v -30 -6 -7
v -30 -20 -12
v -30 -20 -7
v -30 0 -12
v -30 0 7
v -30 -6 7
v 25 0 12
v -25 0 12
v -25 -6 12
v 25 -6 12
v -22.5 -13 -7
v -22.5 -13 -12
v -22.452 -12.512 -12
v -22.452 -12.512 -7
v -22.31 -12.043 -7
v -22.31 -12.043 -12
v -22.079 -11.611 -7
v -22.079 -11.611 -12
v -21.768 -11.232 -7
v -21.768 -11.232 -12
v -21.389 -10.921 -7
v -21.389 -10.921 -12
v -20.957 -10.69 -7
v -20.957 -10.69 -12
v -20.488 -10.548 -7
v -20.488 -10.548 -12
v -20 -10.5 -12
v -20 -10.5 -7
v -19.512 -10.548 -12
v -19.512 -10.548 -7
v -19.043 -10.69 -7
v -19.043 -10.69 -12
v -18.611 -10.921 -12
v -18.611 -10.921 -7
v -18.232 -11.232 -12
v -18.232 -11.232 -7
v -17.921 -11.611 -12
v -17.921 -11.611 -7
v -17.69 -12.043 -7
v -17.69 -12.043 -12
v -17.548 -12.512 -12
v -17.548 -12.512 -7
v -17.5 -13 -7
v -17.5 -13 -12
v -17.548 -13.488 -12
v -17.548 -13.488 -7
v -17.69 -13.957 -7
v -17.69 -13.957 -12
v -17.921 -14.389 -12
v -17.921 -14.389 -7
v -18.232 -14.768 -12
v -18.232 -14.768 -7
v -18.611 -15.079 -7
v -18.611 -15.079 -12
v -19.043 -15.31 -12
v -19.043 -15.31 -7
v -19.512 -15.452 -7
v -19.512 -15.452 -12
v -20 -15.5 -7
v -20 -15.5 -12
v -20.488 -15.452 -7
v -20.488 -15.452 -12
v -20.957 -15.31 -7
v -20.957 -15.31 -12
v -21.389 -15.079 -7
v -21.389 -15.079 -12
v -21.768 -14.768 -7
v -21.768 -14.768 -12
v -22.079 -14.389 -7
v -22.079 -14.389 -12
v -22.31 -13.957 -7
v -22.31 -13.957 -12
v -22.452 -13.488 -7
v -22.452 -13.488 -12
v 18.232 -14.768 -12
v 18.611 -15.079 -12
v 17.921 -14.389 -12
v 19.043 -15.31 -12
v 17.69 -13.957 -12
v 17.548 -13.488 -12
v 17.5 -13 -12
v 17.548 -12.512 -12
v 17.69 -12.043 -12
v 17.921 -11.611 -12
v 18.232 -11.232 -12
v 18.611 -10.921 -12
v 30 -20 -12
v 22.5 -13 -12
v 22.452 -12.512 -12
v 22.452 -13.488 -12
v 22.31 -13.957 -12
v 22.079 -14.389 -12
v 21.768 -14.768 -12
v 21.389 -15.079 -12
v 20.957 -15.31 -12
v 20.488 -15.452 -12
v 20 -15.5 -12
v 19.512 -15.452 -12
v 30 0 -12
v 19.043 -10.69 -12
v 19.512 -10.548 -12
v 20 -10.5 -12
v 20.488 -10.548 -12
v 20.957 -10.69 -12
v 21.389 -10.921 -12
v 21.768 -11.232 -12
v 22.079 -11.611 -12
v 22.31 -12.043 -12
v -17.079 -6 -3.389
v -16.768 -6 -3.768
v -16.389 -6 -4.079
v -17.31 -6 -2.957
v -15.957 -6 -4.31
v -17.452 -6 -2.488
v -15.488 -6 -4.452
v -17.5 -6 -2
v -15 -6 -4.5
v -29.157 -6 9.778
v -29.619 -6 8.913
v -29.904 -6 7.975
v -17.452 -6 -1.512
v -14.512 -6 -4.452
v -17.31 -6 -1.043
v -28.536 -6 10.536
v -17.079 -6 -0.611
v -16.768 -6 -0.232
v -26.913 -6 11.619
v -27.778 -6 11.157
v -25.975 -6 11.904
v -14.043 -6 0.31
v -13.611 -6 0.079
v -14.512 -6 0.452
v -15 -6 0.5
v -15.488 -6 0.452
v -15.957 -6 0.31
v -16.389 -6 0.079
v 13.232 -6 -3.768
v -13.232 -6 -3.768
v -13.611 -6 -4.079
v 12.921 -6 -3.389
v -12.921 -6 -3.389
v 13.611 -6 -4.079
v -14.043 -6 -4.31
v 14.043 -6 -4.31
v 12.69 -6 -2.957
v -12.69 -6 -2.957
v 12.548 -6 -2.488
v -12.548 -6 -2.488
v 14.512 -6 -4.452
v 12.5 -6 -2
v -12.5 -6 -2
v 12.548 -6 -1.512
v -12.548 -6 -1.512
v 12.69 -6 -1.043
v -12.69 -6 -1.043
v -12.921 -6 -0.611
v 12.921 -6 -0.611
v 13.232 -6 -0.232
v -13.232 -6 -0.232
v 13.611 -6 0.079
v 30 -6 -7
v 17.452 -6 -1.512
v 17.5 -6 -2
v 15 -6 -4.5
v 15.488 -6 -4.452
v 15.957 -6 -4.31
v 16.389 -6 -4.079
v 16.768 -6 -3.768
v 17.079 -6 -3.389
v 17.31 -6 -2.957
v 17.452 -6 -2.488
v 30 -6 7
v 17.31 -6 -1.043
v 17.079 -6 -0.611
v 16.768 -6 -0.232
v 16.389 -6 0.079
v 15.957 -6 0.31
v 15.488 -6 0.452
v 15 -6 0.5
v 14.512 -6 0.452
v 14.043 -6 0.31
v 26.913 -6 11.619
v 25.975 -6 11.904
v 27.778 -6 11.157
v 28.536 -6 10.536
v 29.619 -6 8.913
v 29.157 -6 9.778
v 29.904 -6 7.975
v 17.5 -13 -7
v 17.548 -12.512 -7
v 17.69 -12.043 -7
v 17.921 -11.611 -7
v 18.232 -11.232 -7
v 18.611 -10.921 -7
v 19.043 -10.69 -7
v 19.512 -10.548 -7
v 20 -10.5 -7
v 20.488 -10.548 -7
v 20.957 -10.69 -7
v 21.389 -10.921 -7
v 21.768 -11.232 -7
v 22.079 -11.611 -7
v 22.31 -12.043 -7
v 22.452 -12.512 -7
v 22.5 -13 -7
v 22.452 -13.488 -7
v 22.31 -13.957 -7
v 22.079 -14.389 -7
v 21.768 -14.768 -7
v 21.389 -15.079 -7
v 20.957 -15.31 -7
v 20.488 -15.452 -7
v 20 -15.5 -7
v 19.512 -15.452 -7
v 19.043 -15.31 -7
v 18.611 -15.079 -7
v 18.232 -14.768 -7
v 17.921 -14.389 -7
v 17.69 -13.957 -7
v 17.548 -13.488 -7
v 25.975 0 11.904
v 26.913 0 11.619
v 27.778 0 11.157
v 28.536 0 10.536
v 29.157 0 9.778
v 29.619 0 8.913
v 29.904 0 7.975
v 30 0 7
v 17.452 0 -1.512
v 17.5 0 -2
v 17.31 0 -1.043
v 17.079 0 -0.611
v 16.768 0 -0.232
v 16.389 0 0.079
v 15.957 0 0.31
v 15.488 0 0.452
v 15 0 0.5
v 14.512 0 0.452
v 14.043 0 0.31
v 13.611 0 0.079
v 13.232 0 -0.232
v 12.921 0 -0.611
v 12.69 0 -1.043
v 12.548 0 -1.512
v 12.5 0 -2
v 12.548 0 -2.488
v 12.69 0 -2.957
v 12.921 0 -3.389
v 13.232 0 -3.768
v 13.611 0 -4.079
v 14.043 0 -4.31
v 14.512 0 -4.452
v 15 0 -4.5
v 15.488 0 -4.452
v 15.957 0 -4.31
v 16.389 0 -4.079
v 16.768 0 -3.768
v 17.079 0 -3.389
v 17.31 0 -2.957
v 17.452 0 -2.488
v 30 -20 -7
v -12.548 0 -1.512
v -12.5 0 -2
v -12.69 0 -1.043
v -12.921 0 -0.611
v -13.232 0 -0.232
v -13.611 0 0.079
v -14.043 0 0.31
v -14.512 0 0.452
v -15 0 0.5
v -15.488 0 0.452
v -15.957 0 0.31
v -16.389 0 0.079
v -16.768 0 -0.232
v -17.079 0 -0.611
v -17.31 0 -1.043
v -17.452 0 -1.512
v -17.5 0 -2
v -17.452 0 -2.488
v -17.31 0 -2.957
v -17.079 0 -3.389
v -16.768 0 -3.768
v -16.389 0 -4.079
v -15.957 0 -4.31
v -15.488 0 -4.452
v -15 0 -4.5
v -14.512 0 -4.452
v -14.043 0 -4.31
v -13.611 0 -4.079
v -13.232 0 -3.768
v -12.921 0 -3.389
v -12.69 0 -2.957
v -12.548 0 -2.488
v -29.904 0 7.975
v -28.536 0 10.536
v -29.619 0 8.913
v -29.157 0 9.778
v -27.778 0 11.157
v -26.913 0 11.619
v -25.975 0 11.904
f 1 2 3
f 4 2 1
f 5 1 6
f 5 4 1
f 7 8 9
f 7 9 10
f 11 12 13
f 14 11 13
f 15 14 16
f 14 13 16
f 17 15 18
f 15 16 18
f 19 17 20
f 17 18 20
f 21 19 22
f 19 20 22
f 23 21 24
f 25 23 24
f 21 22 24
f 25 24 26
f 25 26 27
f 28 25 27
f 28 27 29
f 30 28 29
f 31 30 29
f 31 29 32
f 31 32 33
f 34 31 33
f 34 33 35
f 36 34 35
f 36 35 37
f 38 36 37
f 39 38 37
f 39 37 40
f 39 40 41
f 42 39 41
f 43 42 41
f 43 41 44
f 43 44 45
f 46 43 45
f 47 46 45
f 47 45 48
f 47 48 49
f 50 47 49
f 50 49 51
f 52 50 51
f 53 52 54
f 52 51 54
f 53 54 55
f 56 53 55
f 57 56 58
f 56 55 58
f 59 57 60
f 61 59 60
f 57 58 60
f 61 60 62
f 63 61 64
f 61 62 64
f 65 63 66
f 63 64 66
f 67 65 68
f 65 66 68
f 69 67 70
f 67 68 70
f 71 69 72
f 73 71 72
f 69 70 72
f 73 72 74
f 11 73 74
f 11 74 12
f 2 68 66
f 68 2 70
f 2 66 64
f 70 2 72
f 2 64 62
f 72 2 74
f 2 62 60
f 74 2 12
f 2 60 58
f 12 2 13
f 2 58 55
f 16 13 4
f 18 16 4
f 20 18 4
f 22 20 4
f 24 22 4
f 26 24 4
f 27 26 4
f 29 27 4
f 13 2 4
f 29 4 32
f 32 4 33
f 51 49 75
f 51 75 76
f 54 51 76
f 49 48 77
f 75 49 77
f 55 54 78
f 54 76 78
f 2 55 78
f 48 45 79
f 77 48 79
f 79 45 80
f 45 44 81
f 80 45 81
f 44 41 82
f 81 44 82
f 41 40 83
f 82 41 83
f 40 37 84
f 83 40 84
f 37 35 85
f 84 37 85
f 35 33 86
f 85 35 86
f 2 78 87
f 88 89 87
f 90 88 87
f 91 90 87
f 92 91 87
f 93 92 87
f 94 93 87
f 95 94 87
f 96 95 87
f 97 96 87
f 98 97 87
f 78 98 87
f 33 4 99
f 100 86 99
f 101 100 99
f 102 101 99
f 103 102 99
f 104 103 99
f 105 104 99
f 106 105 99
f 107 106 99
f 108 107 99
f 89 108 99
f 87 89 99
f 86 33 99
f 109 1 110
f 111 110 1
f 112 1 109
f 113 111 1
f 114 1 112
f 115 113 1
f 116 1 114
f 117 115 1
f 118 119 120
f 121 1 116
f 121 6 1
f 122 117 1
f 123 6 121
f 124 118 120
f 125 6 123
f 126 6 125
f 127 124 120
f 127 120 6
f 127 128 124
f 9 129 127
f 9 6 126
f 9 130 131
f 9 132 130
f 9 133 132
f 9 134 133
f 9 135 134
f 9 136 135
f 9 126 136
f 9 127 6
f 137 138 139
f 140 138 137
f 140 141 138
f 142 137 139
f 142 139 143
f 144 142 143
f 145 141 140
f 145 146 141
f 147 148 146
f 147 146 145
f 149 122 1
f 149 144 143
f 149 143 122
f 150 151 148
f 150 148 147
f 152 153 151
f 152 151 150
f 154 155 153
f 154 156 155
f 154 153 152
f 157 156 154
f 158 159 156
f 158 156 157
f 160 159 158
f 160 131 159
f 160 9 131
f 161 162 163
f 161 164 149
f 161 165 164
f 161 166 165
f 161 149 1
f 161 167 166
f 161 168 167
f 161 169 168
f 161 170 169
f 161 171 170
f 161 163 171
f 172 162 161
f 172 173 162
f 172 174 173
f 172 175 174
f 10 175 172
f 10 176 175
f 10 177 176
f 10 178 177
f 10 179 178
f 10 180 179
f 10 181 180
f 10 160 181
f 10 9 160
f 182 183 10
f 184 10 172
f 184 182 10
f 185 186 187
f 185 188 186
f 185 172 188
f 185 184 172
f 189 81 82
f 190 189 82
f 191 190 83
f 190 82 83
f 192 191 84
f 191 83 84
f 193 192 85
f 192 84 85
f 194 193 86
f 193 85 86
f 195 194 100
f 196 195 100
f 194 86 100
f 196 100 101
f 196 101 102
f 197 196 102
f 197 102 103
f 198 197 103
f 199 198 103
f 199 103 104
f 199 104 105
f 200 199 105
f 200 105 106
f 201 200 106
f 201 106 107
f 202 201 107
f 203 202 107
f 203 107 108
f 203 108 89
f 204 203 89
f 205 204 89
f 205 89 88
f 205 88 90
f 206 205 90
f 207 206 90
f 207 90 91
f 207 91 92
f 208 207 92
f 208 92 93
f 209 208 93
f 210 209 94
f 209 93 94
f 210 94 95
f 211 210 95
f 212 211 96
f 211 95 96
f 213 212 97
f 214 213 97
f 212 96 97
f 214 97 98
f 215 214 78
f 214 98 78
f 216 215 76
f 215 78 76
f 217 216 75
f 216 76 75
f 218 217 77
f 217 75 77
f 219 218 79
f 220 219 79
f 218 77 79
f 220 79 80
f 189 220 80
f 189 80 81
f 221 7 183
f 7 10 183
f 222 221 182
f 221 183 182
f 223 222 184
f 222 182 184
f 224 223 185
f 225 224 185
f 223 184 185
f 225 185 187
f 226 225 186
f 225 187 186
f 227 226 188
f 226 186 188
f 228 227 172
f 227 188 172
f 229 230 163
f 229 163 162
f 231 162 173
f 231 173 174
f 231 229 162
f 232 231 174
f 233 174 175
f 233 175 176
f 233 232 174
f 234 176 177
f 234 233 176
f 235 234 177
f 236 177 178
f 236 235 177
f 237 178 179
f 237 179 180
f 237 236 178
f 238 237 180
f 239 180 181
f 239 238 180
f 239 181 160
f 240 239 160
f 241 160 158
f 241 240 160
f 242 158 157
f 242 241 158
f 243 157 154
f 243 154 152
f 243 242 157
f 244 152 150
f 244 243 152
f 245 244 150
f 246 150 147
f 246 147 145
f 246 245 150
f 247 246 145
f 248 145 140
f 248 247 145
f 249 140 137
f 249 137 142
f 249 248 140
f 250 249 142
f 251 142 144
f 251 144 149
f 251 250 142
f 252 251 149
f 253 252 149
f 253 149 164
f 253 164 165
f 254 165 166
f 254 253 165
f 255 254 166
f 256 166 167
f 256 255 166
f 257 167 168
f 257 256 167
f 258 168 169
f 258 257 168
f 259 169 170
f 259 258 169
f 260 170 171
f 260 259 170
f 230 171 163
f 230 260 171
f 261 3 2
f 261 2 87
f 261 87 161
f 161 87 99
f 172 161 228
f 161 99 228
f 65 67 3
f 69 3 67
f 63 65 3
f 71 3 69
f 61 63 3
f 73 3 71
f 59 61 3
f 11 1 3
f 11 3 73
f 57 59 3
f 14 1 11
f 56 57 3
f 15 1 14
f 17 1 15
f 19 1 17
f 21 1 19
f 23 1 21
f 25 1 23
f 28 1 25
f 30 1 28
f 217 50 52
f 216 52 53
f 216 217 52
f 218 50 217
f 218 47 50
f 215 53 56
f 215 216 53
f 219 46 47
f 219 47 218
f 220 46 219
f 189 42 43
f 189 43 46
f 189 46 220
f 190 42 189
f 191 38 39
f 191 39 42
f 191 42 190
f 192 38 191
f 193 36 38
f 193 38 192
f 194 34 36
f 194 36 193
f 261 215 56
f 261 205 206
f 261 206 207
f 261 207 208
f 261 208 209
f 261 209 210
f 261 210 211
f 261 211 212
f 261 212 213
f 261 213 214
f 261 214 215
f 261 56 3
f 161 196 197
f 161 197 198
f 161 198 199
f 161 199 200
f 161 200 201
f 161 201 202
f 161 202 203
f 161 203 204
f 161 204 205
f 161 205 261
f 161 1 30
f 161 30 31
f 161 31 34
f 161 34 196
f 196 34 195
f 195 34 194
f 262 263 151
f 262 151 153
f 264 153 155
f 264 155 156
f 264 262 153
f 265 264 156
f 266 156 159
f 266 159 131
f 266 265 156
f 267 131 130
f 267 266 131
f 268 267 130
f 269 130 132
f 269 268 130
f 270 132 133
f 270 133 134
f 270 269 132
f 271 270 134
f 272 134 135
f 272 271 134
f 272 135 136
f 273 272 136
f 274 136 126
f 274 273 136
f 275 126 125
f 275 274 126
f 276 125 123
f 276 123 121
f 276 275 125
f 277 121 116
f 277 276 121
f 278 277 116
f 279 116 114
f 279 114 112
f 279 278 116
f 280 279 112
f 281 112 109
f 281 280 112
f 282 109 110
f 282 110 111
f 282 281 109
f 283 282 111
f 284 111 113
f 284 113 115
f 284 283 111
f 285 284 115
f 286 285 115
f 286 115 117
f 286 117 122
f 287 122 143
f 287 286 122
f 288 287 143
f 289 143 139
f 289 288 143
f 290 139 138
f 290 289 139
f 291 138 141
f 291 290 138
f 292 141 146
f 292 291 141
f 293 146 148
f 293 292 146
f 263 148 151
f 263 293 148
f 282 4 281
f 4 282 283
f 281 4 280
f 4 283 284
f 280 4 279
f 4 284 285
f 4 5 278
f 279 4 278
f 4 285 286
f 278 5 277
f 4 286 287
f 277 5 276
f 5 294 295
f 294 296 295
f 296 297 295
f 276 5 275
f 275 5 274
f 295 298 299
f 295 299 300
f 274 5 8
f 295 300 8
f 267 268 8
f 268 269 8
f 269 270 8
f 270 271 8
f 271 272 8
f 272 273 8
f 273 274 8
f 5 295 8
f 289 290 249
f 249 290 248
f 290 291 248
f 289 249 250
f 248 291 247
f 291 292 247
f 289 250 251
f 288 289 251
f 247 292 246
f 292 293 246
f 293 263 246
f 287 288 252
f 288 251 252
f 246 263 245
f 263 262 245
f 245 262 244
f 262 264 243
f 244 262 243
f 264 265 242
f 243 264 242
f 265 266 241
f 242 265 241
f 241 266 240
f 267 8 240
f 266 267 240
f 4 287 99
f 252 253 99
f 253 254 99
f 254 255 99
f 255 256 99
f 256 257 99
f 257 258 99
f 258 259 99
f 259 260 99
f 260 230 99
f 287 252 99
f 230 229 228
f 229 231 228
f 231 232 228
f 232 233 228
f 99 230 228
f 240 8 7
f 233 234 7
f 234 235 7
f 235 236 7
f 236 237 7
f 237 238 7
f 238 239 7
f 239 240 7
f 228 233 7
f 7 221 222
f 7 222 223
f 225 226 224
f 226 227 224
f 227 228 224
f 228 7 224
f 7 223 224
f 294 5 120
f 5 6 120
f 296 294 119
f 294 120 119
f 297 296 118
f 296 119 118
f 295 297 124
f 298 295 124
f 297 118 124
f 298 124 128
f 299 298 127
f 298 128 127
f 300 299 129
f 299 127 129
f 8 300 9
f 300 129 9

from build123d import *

# Parameters (mm, degrees)
F0_W     = 60
F0_H     = 19
F0_R     = 2.5
F1_DEPTH = 6
F0_H_2   = 5
F2_DEPTH = 20
F4_D     = 5
F5_R     = 5


with BuildPart() as f1:
    # F0 (on Front) → F1 (new body)
    with BuildSketch(Plane.XZ):
        with Locations((0, 2.5)):
            Rectangle(F0_W, F0_H)
        with Locations((-15, -2)):
            Circle(F0_R, mode=Mode.SUBTRACT)
        with Locations((15, -2)):
            Circle(F0_R, mode=Mode.SUBTRACT)
    extrude(amount=F1_DEPTH)

    # F0 (on Front) → F2 (join)
    with BuildSketch(Plane.XZ):
        with Locations((0, -9.5)):
            Rectangle(F0_W, F0_H_2)
    extrude(amount=F2_DEPTH)

    # F4 (through all)
    with Locations(Plane.XY.offset(-7)):
        with Locations((-20, -13), (20, -13)):
            Hole(F4_D / 2)

    # F5
    f5_edges = [f1.edges().sort_by_distance(p)[0] for p in [
        (-30, -3, 12),
        (30, -3, 12),
    ]]
    fillet(f5_edges, radius=F5_R)


solid = f1.part
